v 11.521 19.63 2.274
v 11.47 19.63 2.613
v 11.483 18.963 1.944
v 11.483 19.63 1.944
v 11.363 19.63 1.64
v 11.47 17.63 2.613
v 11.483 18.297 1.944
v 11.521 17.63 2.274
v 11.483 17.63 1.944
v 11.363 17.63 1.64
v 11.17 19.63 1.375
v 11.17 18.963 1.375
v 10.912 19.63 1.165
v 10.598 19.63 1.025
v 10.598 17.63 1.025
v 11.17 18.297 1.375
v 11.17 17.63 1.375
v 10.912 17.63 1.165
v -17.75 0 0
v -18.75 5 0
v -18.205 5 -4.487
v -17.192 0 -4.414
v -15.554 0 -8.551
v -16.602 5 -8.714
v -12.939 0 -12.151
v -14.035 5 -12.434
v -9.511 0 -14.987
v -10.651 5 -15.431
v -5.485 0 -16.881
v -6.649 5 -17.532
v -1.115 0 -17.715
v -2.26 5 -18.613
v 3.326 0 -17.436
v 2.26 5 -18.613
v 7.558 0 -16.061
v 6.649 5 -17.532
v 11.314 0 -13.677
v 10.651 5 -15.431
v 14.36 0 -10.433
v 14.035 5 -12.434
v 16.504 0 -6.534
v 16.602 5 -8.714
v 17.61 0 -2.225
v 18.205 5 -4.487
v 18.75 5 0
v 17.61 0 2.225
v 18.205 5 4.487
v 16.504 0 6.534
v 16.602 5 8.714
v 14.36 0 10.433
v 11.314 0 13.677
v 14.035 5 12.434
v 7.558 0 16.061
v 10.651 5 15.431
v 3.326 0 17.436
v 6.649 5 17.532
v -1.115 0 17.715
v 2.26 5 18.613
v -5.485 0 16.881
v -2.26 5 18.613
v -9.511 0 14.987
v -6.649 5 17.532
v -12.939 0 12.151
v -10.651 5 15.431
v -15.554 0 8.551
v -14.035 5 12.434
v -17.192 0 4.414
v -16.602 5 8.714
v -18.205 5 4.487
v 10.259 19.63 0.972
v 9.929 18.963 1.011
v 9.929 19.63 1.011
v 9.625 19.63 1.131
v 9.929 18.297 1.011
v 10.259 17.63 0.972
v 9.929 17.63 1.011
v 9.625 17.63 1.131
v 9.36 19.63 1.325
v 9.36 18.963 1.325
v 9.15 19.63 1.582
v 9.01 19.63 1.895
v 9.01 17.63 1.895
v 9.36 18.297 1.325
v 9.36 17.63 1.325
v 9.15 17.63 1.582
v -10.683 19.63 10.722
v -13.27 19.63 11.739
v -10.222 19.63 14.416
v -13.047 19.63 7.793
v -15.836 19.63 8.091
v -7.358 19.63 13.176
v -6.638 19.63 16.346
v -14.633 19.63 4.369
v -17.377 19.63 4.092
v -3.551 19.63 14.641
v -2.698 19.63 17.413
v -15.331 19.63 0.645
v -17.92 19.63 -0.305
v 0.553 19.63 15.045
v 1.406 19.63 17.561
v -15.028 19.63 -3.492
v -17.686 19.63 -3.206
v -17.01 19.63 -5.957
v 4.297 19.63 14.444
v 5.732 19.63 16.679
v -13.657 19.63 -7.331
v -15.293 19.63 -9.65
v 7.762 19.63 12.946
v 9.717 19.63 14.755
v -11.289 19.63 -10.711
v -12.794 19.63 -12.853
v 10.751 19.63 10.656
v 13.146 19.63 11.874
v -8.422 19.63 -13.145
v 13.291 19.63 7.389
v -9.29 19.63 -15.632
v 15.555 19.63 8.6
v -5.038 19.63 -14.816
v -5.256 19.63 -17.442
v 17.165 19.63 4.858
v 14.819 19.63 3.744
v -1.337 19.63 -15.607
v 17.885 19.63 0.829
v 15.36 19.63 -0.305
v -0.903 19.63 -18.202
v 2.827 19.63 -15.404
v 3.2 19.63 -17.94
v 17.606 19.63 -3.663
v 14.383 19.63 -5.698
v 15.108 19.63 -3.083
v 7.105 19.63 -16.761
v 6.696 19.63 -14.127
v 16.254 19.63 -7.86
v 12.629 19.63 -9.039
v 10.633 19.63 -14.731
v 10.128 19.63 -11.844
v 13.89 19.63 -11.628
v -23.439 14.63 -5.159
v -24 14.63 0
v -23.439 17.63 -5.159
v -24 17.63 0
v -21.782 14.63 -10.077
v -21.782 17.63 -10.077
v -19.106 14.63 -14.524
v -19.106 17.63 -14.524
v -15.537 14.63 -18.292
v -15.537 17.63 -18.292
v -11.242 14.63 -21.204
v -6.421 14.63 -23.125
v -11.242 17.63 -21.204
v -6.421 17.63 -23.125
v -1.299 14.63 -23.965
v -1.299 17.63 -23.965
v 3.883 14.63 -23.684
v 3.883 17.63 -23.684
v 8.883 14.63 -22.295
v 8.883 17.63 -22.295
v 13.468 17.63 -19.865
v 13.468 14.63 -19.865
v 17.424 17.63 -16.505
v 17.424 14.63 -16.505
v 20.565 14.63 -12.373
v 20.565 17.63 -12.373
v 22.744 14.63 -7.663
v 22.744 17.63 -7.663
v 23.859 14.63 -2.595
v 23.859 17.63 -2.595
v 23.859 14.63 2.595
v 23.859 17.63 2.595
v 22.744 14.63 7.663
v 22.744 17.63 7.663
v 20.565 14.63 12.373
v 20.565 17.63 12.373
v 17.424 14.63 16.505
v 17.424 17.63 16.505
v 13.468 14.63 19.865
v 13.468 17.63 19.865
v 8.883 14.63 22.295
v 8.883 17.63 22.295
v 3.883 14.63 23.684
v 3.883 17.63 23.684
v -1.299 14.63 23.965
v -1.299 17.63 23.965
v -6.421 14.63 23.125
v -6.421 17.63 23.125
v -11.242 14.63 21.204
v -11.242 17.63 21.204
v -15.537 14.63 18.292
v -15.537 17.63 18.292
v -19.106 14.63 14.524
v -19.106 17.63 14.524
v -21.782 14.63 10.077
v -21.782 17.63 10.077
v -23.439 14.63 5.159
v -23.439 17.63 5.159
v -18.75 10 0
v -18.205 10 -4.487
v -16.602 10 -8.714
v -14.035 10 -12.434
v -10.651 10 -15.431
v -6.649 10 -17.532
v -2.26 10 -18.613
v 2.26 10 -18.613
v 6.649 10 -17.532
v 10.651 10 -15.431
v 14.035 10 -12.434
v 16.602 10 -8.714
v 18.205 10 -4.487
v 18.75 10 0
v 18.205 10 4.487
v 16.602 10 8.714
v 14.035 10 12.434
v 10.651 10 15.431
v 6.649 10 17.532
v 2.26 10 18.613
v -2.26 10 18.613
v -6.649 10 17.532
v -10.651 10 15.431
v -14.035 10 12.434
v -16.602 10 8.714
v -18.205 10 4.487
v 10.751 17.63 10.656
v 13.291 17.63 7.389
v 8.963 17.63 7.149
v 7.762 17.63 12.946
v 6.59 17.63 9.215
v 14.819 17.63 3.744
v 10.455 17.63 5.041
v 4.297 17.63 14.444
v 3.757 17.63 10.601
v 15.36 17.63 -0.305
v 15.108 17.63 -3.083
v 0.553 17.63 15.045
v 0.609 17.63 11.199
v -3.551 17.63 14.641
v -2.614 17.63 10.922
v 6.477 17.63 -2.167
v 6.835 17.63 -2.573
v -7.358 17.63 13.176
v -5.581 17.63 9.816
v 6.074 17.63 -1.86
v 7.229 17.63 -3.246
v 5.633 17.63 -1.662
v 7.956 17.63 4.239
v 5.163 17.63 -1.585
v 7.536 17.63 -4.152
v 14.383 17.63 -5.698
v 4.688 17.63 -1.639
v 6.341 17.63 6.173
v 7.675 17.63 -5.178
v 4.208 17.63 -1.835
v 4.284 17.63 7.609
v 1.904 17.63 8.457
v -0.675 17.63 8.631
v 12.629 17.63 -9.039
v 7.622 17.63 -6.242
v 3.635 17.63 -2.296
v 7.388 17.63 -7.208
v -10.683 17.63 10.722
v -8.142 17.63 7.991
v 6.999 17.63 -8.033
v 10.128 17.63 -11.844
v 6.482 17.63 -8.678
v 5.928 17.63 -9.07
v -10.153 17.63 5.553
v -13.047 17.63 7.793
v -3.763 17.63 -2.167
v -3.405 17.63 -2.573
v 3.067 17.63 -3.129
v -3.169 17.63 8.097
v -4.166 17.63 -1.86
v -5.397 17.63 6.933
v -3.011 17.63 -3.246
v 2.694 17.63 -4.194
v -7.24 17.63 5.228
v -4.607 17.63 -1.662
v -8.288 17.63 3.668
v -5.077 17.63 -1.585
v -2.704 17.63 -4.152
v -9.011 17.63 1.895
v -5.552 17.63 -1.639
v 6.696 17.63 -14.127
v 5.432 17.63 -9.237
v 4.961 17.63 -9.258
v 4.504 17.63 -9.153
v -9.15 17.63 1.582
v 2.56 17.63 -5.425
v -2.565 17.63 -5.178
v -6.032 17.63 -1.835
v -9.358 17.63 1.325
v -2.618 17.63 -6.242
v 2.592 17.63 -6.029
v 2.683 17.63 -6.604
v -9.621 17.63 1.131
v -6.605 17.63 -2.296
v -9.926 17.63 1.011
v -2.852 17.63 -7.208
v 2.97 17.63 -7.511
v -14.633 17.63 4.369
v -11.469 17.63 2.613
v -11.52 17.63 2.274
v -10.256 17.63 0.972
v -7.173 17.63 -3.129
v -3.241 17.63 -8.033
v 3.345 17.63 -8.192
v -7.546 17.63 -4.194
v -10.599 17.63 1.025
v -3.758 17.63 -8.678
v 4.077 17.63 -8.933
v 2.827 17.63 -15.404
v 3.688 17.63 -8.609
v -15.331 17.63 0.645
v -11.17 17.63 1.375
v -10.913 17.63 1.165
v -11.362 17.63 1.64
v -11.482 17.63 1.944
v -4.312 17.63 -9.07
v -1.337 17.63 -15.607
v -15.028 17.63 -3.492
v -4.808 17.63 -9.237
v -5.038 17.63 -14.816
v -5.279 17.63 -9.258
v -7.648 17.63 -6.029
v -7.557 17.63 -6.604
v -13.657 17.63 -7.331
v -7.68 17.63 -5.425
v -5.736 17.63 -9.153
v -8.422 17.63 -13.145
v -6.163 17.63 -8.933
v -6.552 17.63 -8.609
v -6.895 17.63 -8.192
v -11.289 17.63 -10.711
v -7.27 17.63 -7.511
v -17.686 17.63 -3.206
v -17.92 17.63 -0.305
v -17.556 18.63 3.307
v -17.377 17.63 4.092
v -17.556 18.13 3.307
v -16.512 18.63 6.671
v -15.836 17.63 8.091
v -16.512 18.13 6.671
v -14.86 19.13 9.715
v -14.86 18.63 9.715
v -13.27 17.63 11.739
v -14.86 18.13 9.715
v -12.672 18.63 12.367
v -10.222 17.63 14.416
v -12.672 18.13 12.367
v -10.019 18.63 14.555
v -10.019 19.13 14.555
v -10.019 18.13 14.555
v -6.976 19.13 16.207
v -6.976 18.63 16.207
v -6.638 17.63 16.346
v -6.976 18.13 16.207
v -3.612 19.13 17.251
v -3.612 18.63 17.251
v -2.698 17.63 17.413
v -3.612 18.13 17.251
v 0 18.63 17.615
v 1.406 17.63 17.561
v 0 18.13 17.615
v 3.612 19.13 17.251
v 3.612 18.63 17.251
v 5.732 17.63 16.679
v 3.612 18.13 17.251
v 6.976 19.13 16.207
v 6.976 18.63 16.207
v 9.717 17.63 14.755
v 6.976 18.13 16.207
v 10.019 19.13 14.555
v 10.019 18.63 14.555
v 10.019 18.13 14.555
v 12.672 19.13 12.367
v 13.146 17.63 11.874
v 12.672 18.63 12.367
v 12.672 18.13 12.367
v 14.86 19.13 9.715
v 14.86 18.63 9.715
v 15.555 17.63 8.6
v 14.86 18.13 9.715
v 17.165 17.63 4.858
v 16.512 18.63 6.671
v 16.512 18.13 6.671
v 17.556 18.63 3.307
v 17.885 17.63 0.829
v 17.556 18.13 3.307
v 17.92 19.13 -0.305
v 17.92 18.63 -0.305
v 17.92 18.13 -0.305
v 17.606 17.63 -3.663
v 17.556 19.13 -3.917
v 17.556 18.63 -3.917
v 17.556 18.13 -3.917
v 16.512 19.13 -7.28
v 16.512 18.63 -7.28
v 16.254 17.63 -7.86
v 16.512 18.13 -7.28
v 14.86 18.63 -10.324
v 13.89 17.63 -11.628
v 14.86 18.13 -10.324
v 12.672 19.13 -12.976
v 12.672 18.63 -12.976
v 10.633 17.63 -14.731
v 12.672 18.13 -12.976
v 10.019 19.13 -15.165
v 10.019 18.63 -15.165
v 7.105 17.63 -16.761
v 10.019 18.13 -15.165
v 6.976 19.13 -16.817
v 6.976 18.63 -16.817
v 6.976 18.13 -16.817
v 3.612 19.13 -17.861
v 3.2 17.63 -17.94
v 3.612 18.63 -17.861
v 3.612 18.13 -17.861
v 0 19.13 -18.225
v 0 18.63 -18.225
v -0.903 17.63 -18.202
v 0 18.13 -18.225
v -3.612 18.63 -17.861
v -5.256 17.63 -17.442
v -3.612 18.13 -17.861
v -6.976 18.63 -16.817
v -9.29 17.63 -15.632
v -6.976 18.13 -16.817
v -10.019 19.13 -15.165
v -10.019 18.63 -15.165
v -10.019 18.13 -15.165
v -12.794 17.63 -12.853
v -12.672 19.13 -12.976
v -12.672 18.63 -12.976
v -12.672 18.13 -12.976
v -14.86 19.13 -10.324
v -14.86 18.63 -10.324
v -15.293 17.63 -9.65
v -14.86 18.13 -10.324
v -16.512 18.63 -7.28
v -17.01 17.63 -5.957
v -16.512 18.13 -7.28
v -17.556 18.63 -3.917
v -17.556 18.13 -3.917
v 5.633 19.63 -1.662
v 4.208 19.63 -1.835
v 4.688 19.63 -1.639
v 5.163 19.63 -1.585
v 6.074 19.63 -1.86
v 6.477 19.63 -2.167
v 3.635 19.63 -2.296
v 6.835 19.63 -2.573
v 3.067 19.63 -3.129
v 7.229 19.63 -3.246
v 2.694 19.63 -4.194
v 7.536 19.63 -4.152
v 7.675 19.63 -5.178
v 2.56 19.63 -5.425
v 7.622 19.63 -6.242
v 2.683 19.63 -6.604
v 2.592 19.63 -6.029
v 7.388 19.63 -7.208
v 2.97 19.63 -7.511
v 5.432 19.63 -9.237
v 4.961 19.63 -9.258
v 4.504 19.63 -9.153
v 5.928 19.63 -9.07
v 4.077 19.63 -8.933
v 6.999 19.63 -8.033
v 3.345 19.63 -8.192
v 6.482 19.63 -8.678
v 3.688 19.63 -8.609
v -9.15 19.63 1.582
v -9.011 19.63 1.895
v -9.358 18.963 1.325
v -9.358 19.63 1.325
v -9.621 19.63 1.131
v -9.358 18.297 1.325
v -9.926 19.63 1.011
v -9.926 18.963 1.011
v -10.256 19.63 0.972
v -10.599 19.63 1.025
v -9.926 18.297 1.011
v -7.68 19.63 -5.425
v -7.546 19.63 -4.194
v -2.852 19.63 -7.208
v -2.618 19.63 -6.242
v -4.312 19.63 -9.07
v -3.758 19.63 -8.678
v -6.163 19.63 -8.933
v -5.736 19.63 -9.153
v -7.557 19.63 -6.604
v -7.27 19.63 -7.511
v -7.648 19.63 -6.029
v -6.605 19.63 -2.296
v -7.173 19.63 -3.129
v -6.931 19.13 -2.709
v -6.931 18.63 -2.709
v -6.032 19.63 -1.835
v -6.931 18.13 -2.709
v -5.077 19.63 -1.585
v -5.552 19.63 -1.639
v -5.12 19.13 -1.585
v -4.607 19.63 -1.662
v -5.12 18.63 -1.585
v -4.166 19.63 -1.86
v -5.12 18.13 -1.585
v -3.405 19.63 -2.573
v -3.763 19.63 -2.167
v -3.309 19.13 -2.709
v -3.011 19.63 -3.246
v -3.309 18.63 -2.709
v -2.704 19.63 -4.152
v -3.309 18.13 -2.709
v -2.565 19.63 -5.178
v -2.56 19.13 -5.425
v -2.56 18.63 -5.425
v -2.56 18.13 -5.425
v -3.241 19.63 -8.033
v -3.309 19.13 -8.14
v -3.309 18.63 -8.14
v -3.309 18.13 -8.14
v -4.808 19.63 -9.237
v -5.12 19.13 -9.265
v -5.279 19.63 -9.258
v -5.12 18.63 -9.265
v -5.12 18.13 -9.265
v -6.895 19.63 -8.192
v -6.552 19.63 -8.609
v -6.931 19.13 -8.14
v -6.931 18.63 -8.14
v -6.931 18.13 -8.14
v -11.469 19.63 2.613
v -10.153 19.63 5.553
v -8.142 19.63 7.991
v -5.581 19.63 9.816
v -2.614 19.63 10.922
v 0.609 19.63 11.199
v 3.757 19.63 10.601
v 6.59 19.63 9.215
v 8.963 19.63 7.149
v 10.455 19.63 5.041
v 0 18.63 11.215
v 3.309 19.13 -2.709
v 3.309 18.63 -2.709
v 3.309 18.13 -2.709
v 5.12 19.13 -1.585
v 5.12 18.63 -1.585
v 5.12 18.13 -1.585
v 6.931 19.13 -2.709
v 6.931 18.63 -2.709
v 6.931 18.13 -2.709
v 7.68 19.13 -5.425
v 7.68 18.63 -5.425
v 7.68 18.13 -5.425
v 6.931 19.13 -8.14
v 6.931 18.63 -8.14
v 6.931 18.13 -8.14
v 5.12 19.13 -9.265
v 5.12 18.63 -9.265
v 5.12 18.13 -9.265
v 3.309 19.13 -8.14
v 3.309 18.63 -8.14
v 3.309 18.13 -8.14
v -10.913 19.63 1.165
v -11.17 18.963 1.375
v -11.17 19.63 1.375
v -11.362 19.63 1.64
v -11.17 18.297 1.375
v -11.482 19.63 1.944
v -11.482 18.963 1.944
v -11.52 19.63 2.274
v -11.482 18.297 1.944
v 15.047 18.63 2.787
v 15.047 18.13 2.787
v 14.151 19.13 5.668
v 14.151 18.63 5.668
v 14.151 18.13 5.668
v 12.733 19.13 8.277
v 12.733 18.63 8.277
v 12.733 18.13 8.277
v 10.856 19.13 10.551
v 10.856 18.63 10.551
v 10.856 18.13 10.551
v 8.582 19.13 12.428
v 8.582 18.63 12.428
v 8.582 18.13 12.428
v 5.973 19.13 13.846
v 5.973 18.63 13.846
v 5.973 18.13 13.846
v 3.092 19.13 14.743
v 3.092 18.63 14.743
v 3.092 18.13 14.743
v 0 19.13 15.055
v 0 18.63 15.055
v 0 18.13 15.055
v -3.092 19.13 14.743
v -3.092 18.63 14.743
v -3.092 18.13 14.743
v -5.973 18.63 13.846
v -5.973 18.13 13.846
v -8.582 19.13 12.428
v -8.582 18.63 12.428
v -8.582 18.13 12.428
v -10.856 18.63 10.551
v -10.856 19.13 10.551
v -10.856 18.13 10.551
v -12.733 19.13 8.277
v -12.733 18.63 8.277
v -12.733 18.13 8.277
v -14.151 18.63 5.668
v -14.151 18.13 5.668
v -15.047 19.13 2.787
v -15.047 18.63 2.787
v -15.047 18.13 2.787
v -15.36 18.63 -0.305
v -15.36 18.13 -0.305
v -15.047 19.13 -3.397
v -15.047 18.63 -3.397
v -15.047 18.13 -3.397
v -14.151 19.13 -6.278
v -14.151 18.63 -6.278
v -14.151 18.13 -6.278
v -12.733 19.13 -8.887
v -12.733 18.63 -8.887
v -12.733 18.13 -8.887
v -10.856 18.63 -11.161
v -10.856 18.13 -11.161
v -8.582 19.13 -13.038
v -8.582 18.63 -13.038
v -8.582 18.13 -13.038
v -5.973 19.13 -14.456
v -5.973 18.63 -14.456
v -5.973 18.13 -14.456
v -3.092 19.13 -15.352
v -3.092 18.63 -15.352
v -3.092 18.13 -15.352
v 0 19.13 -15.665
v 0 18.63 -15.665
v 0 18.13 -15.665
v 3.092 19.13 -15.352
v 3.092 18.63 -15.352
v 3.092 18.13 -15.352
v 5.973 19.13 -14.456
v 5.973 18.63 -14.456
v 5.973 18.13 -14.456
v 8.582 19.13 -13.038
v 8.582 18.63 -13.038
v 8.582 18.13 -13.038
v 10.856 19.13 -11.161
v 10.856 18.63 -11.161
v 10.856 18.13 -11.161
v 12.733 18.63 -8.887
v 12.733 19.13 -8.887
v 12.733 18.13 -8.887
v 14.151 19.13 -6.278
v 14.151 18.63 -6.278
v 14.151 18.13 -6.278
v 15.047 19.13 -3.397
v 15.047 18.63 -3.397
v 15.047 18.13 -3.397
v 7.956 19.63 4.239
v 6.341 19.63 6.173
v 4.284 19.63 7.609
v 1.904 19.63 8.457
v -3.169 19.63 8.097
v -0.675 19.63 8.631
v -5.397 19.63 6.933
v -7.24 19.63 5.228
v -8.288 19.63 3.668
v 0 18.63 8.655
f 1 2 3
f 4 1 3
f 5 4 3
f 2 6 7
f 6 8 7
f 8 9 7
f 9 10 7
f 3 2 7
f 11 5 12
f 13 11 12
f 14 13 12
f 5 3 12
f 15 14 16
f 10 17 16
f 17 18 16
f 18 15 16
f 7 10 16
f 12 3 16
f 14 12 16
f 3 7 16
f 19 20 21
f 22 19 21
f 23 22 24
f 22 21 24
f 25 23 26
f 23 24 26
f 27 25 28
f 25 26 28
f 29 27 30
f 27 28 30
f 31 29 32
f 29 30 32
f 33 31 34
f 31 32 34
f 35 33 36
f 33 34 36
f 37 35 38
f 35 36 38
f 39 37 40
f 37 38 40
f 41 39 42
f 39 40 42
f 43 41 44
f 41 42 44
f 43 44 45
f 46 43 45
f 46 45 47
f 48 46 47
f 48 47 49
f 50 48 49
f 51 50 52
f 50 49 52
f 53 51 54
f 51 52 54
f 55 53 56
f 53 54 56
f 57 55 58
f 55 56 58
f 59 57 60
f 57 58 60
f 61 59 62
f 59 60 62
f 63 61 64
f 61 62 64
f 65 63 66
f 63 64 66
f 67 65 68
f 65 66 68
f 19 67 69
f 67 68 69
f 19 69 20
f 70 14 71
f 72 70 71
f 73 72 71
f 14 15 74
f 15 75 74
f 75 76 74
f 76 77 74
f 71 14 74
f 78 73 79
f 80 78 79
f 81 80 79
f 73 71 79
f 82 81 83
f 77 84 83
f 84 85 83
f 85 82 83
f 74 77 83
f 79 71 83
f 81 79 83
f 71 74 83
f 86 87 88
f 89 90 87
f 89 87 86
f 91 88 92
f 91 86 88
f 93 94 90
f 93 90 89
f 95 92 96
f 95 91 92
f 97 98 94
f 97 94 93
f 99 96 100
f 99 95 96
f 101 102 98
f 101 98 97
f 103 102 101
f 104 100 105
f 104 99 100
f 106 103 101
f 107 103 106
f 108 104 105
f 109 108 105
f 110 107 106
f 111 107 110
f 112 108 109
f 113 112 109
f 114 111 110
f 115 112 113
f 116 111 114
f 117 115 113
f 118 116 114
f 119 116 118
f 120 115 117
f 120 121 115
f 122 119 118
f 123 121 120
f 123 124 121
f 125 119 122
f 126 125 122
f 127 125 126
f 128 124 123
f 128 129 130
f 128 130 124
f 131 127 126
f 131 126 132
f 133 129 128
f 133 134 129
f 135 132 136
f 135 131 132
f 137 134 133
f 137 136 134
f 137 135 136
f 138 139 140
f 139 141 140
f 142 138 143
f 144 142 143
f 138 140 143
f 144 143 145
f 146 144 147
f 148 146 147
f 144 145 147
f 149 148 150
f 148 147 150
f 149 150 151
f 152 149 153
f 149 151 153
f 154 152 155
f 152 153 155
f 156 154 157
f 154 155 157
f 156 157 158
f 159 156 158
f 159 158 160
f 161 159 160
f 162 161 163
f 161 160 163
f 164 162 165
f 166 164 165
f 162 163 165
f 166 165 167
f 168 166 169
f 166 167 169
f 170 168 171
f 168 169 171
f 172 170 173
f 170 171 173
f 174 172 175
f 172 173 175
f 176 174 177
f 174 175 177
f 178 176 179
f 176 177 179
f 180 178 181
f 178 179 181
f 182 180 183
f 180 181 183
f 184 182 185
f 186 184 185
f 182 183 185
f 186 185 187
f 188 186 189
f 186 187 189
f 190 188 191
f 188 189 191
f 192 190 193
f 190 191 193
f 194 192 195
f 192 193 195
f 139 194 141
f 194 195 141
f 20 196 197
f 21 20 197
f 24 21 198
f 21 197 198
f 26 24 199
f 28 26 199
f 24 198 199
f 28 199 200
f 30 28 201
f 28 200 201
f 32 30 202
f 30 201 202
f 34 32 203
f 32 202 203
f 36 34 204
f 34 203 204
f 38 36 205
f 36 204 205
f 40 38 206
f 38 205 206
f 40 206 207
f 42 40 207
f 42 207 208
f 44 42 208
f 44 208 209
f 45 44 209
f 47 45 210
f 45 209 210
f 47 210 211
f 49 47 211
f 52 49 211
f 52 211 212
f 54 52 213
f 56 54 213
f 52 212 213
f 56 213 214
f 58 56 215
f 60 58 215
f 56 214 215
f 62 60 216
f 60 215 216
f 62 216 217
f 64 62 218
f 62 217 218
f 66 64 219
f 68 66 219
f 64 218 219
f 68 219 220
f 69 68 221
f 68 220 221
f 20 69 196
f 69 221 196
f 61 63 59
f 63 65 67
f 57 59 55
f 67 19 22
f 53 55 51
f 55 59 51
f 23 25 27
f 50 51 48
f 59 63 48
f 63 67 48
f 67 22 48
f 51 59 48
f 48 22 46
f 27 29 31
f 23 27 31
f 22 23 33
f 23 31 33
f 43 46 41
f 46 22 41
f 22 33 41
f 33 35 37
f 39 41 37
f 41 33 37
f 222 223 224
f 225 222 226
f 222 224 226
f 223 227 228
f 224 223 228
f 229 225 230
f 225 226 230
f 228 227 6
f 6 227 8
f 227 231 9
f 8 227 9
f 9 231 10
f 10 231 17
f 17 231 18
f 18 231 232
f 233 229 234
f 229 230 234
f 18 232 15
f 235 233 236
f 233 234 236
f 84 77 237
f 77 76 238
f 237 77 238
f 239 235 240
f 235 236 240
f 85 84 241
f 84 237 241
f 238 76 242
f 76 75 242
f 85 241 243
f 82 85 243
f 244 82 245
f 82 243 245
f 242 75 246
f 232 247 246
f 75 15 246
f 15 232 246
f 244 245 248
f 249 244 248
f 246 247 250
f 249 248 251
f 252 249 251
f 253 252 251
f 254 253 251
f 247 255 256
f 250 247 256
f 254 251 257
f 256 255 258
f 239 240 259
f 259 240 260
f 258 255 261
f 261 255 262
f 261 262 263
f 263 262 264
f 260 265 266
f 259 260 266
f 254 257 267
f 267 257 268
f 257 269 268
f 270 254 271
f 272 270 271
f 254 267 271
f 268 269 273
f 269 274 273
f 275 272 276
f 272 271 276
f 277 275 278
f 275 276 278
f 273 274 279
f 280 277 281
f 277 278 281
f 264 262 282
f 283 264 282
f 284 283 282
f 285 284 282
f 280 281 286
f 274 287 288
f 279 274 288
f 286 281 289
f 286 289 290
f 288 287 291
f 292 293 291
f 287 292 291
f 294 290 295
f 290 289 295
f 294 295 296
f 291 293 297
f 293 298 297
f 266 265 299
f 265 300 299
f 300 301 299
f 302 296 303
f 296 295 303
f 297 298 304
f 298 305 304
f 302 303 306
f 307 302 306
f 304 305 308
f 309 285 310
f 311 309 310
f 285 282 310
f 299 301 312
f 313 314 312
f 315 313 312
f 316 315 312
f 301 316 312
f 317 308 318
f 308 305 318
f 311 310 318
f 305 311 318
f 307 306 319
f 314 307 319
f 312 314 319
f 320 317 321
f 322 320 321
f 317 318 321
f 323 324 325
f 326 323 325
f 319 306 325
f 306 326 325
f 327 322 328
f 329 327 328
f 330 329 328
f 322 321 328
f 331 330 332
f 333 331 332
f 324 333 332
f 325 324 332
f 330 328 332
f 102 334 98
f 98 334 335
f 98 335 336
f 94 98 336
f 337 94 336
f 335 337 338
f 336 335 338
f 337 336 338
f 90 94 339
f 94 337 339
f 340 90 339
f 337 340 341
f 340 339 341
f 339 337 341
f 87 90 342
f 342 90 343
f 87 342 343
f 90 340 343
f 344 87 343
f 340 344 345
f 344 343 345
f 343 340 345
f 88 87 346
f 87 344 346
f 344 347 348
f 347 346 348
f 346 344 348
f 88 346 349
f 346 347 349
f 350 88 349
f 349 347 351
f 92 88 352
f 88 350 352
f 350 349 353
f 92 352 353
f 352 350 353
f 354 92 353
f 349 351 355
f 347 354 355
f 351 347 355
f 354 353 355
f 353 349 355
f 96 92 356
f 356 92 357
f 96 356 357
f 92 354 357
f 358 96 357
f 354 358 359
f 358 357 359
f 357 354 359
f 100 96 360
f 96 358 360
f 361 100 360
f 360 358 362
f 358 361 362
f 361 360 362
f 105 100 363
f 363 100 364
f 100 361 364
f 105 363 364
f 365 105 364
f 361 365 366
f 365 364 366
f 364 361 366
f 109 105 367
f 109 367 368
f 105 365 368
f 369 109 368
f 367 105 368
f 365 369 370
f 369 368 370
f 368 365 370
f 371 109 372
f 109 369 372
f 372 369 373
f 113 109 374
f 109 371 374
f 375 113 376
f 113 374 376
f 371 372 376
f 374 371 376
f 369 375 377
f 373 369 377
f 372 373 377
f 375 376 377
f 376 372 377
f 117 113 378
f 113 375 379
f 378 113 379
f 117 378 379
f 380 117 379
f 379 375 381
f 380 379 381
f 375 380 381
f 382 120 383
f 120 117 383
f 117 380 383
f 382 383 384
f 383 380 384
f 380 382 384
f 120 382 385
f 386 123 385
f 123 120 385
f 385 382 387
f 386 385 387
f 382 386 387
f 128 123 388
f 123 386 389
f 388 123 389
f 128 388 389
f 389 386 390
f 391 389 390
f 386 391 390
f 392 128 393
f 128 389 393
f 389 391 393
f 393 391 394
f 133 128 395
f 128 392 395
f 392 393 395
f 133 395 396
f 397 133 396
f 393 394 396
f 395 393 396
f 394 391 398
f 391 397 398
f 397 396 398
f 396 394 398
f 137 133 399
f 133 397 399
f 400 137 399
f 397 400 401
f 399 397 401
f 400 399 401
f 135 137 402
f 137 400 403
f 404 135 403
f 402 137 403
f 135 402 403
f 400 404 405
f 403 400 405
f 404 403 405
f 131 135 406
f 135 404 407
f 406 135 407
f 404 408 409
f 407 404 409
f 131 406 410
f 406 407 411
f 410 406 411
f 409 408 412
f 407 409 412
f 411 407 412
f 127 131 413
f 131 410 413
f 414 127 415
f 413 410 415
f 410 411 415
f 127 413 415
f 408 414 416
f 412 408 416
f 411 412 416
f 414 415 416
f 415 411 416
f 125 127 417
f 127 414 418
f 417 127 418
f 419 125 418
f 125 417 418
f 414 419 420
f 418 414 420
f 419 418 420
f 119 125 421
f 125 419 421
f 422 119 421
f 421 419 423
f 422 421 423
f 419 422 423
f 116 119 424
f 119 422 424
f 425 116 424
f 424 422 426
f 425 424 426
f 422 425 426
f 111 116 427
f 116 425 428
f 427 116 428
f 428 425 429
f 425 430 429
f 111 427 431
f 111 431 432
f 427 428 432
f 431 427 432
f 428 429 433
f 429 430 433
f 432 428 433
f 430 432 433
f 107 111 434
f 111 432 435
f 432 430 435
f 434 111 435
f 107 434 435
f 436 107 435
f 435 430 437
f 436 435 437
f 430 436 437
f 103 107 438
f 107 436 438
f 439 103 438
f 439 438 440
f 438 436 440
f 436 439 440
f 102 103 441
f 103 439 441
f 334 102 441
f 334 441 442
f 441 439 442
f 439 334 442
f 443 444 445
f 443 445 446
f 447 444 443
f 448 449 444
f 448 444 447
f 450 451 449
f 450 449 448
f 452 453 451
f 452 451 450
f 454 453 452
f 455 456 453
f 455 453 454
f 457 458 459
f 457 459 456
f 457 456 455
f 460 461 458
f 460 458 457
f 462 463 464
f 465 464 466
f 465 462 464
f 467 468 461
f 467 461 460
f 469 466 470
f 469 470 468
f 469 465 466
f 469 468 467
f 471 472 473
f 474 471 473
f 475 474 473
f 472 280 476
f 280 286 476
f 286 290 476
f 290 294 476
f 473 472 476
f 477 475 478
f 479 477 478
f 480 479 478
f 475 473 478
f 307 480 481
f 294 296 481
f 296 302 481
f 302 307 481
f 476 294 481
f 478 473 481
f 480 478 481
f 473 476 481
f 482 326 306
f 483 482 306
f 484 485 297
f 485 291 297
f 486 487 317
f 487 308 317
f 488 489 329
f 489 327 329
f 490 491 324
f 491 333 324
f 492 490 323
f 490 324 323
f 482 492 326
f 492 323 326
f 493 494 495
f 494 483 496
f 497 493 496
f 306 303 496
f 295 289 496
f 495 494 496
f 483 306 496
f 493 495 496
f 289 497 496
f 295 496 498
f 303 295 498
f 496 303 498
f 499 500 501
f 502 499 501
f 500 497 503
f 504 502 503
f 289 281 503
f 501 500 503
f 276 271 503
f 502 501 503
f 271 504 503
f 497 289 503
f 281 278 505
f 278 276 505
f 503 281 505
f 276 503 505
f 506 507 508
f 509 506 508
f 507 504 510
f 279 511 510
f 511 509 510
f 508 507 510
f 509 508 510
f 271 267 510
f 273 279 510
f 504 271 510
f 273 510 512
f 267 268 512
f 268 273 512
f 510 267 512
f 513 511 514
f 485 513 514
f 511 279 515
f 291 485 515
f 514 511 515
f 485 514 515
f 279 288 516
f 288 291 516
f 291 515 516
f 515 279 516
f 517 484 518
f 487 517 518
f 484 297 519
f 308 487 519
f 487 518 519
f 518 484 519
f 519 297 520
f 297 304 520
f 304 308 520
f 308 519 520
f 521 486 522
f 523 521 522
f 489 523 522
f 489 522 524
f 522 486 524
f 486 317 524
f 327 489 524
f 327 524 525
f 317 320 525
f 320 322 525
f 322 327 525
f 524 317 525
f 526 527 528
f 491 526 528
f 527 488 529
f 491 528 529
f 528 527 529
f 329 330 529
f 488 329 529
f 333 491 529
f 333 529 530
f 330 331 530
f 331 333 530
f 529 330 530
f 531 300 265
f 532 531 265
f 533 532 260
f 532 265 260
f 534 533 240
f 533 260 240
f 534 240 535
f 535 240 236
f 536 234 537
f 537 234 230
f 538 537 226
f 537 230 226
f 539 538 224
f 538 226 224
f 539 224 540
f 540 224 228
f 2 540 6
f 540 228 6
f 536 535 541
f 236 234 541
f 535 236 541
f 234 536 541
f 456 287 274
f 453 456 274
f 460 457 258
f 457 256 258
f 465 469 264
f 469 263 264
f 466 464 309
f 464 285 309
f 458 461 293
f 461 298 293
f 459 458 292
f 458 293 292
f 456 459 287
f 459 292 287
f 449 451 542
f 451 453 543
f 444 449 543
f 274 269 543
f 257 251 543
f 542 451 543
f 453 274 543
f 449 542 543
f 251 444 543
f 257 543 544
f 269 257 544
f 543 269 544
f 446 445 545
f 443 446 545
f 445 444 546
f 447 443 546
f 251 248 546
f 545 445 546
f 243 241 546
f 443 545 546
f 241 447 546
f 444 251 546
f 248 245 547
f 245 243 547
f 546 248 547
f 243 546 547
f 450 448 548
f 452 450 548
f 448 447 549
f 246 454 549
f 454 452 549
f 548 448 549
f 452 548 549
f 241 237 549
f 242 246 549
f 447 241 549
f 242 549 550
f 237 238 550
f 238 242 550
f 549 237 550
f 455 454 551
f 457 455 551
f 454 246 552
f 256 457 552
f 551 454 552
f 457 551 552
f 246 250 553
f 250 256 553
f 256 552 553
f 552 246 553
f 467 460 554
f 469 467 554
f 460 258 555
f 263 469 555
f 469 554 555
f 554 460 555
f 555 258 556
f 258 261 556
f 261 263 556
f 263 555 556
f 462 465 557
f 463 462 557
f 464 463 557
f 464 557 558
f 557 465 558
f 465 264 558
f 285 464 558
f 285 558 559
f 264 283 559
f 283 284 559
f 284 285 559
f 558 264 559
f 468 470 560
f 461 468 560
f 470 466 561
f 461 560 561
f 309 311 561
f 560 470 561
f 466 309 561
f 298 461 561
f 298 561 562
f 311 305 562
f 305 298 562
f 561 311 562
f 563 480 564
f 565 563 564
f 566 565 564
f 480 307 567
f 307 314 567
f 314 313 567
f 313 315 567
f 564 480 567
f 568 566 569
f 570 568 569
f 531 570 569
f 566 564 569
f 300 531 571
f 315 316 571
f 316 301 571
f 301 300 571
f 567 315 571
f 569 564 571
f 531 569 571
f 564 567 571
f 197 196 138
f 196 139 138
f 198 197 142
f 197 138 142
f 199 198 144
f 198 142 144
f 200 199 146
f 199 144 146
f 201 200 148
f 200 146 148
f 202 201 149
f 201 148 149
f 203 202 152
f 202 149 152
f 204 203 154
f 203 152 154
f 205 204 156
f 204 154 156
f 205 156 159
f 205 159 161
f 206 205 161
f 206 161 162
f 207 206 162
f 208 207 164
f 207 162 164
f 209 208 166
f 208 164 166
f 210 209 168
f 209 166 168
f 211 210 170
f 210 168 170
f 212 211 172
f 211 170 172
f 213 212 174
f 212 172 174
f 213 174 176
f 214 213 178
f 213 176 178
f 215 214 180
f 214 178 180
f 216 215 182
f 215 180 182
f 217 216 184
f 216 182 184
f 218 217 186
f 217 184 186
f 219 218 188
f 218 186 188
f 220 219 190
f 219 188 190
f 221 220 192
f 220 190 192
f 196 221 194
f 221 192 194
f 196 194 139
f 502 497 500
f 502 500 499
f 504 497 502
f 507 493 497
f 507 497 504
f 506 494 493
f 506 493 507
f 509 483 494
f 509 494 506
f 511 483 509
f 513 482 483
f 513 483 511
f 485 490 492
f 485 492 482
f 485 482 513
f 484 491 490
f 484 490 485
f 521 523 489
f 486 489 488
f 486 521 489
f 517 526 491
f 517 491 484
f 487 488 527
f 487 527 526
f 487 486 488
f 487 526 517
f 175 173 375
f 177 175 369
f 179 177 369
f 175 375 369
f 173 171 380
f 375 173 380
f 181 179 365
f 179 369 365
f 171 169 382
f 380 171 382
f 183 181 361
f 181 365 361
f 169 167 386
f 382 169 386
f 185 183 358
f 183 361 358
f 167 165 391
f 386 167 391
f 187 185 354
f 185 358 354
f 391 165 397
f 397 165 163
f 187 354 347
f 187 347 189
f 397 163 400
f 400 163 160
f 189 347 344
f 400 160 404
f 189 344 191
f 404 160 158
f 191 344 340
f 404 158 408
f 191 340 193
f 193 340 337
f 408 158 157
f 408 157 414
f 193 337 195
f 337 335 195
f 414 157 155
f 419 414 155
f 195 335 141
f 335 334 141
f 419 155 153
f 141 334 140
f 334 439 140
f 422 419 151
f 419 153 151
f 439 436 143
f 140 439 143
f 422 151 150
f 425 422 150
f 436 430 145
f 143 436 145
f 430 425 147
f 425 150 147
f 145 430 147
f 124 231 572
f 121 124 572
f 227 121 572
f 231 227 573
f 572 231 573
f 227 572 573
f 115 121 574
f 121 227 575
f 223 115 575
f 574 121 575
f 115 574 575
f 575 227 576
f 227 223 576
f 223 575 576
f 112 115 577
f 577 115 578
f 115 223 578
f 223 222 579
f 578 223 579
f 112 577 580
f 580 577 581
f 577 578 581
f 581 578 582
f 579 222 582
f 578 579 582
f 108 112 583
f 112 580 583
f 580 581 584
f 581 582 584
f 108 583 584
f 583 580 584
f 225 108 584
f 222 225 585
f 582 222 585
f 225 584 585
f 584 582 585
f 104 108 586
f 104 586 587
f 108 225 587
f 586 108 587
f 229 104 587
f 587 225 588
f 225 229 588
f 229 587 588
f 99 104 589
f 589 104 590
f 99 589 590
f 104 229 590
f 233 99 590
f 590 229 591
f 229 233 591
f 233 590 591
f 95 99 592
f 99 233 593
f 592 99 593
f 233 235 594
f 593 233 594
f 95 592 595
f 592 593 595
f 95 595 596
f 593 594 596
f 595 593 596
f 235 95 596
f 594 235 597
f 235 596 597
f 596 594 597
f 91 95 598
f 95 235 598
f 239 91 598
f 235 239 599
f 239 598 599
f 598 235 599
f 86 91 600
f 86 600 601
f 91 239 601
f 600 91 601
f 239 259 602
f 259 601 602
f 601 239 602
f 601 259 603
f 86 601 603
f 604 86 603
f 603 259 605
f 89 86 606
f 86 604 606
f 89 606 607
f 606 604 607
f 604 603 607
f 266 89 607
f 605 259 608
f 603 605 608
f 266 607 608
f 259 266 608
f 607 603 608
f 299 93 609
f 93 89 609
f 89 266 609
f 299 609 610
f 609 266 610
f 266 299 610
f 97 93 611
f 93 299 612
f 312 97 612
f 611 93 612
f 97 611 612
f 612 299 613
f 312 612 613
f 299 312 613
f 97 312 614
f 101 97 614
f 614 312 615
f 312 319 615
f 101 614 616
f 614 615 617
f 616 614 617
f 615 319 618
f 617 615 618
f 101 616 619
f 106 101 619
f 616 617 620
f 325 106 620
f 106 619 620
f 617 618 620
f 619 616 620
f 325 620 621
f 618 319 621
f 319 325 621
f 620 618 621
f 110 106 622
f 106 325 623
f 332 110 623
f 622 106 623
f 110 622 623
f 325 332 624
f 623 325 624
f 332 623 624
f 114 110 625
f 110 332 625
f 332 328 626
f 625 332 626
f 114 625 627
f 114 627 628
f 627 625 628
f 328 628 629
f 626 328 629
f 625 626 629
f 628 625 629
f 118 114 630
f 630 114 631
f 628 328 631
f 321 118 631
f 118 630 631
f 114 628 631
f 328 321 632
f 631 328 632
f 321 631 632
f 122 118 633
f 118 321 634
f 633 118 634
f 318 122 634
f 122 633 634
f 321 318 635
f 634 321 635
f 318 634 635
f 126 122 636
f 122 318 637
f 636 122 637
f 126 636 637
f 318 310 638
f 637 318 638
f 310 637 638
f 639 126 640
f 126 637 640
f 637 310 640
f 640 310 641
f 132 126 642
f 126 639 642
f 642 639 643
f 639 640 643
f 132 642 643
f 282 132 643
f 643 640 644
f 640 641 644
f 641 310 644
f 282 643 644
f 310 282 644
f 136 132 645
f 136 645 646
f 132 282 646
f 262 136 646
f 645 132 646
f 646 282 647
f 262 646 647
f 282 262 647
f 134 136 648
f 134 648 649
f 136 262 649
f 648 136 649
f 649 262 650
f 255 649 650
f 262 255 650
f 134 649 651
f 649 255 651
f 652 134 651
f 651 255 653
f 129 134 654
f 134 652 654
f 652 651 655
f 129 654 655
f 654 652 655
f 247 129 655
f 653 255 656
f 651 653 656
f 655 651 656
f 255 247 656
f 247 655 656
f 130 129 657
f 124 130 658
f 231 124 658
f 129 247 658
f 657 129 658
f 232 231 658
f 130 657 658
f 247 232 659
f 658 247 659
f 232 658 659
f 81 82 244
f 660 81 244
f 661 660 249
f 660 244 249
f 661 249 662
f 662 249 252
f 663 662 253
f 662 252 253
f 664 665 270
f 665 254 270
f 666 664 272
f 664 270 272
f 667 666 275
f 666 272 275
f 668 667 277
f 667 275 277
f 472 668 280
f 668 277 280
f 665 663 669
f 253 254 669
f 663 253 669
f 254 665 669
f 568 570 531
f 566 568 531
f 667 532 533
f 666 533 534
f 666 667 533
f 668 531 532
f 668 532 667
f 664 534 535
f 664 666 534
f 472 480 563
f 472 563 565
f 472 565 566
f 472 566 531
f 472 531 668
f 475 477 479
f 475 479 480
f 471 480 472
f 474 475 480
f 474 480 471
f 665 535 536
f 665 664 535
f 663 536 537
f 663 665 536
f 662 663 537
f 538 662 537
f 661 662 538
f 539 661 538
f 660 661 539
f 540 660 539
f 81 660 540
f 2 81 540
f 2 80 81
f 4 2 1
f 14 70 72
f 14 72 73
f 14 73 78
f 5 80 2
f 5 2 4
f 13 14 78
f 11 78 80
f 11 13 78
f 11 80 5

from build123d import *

# Parameters (mm, degrees)
BOSS_EXTRUDE2_DEPTH = 2
CHAMFER1_SIZE       = 1
CHAMFER1_SIZE2      = 5


with BuildPart() as part:
    # Sketch2 → Revolve1 (revolve)
    with BuildSketch(Plane.XY, mode=Mode.PRIVATE) as revolve1_sk:
        Polygon((0, 0), (18.75, 0), (18.75, 10), (24, 14.630064794), (24, 17.630064794), (0, 17.630064794), align=None)
    revolve(revolve1_sk.sketch.rotate(Axis((0, 17.630064794, 0), (0, -1, 0)), 180), axis=Axis((0, 17.630064794, 0), (0, -1, 0)))

    # Sketch3 → Boss-Extrude2 (add)
    # profile 1 of 4: a face of its own
    with BuildSketch(Plane(origin=(0, 17.630064794, 0), x_dir=(1, 0, 0), z_dir=(0, 1, 0))):
        with BuildLine():
            add(Edge.make_bspline(
                [(0, -17.615132118), (9.89752, -17.615132118), (17.92, -9.592652118), (17.92, 0.304867882)],
                knots=[0, 0, 0, 0, 1, 1, 1, 1], degree=3))
            add(Edge.make_bspline(
                [(17.92, 0.304867882), (17.92, 10.202387882), (9.89752, 18.224867882), (0, 18.224867882)],
                knots=[0, 0, 0, 0, 1, 1, 1, 1], degree=3))
            add(Edge.make_bspline(
                [(0, 18.224867882), (-9.89752, 18.224867882), (-17.92, 10.202387882), (-17.92, 0.304867882)],
                knots=[0, 0, 0, 0, 1, 1, 1, 1], degree=3))
            add(Edge.make_bspline(
                [(-17.92, 0.304867882), (-17.92, -9.592652118), (-9.89752, -17.615132118), (0, -17.615132118)],
                knots=[0, 0, 0, 0, 1, 1, 1, 1], degree=3))
        make_face()
        with BuildLine():
            add(Edge.make_bspline(
                [(0, -15.055132118), (-8.47, -15.055132118), (-15.36, -8.165132118), (-15.36, 0.304867882)],
                knots=[0, 0, 0, 0, 1, 1, 1, 1], degree=3))
            add(Edge.make_bspline(
                [(-15.36, 0.304867882), (-15.36, 8.774867882), (-8.47, 15.664867882), (0, 15.664867882)],
                knots=[0, 0, 0, 0, 1, 1, 1, 1], degree=3))
            add(Edge.make_bspline(
                [(0, 15.664867882), (8.47, 15.664867882), (15.36, 8.774867882), (15.36, 0.304867882)],
                knots=[0, 0, 0, 0, 1, 1, 1, 1], degree=3))
            add(Edge.make_bspline(
                [(15.36, 0.304867882), (15.36, -8.165132118), (8.47, -15.055132118), (0, -15.055132118)],
                knots=[0, 0, 0, 0, 1, 1, 1, 1], degree=3))
        make_face(mode=Mode.SUBTRACT)
    # profile 2 of 4: a face of its own
    with BuildSketch(Plane(origin=(0, 17.630064794, 0), x_dir=(1, 0, 0), z_dir=(0, 1, 0))):
        with BuildLine():
            add(Edge.make_bspline(
                [(5.12, 1.584867882), (6.53496, 1.584867882), (7.68, 3.302387882), (7.68, 5.424867882)],
                knots=[0, 0, 0, 0, 1, 1, 1, 1], degree=3))
            add(Edge.make_bspline(
                [(7.68, 5.424867882), (7.68, 7.544867882), (6.53504, 9.264867882), (5.12, 9.264867882)],
                knots=[0, 0, 0, 0, 1, 1, 1, 1], degree=3))
            add(Edge.make_bspline(
                [(5.12, 9.264867882), (3.70496, 9.264867882), (2.56, 7.544867882), (2.56, 5.424867882)],
                knots=[0, 0, 0, 0, 1, 1, 1, 1], degree=3))
            add(Edge.make_bspline(
                [(2.56, 5.424867882), (2.56, 3.302387882), (3.70504, 1.584867882), (5.12, 1.584867882)],
                knots=[0, 0, 0, 0, 1, 1, 1, 1], degree=3))
        make_face()
    # profile 3 of 4: a face of its own
    with BuildSketch(Plane(origin=(0, 17.630064794, 0), x_dir=(1, 0, 0), z_dir=(0, 1, 0))):
        with BuildLine():
            add(Edge.make_bspline(
                [(-5.12, 1.584867882), (-3.70504, 1.584867882), (-2.56, 3.302387882), (-2.56, 5.424867882)],
                knots=[0, 0, 0, 0, 1, 1, 1, 1], degree=3))
            add(Edge.make_bspline(
                [(-2.56, 5.424867882), (-2.56, 7.544867882), (-3.70496, 9.264867882), (-5.12, 9.264867882)],
                knots=[0, 0, 0, 0, 1, 1, 1, 1], degree=3))
            add(Edge.make_bspline(
                [(-5.12, 9.264867882), (-6.53504, 9.264867882), (-7.68, 7.544867882), (-7.68, 5.424867882)],
                knots=[0, 0, 0, 0, 1, 1, 1, 1], degree=3))
            add(Edge.make_bspline(
                [(-7.68, 5.424867882), (-7.68, 3.302387882), (-6.53496, 1.584867882), (-5.12, 1.584867882)],
                knots=[0, 0, 0, 0, 1, 1, 1, 1], degree=3))
        make_face()
    # profile 4 of 4: a face of its own
    with BuildSketch(Plane(origin=(0, 17.630064794, 0), x_dir=(1, 0, 0), z_dir=(0, 1, 0))):
        with BuildLine():
            add(Edge.make_bspline(
                [(0, -11.215132118), (5.27496, -11.215132118), (9.99, -7.677612118), (11.47, -2.612652118)],
                knots=[0, 0, 0, 0, 1, 1, 1, 1], degree=3))
            add(Edge.make_bspline(
                [(11.47, -2.612652118), (11.66752, -1.935132118), (11.27752, -1.225132118), (10.59752, -1.025132118)],
                knots=[0, 0, 0, 0, 1, 1, 1, 1], degree=3))
            add(Edge.make_bspline(
                [(10.59752, -1.025132118), (9.92, -0.822652118), (9.21, -1.220172118), (9.01, -1.895132118)],
                knots=[0, 0, 0, 0, 1, 1, 1, 1], degree=3))
            add(Edge.make_bspline(
                [(9.01, -1.895132118), (7.85, -5.875132118), (4.14504, -8.655132118), (0, -8.655132118)],
                knots=[0, 0, 0, 0, 1, 1, 1, 1], degree=3))
            add(Edge.make_bspline(
                [(0, -8.655132118), (-4.14504, -8.655132118), (-7.85, -5.875132118), (-9.01128, -1.895132118)],
                knots=[0, 0, 0, 0, 1, 1, 1, 1], degree=3))
            add(Edge.make_bspline(
                [(-9.01128, -1.895132118), (-9.2088, -1.220092118), (-9.91128, -0.822652118), (-10.5988, -1.025132118)],
                knots=[0, 0, 0, 0, 1, 1, 1, 1], degree=3))
            add(Edge.make_bspline(
                [(-10.5988, -1.025132118), (-11.27752, -1.225132118), (-11.66632, -1.935132118), (-11.4688, -2.612652118)],
                knots=[0, 0, 0, 0, 1, 1, 1, 1], degree=3))
            add(Edge.make_bspline(
                [(-11.4688, -2.612652118), (-9.99128, -7.677612118), (-5.27496, -11.215132118), (0, -11.215132118)],
                knots=[0, 0, 0, 0, 1, 1, 1, 1], degree=3))
        make_face()
    extrude(amount=BOSS_EXTRUDE2_DEPTH)

    # Chamfer1
    chamfer1_edges = [part.edges().sort_by_distance(p)[0] for p in [
        (18.75, 0, 0),
    ]]
    chamfer1_side = [part.faces().sort_by_distance(p)[0] for p in [
        (0, 0, 0),
    ]]
    chamfer(chamfer1_edges, length=CHAMFER1_SIZE, length2=CHAMFER1_SIZE2, reference=chamfer1_side[0])


solid = part.part
